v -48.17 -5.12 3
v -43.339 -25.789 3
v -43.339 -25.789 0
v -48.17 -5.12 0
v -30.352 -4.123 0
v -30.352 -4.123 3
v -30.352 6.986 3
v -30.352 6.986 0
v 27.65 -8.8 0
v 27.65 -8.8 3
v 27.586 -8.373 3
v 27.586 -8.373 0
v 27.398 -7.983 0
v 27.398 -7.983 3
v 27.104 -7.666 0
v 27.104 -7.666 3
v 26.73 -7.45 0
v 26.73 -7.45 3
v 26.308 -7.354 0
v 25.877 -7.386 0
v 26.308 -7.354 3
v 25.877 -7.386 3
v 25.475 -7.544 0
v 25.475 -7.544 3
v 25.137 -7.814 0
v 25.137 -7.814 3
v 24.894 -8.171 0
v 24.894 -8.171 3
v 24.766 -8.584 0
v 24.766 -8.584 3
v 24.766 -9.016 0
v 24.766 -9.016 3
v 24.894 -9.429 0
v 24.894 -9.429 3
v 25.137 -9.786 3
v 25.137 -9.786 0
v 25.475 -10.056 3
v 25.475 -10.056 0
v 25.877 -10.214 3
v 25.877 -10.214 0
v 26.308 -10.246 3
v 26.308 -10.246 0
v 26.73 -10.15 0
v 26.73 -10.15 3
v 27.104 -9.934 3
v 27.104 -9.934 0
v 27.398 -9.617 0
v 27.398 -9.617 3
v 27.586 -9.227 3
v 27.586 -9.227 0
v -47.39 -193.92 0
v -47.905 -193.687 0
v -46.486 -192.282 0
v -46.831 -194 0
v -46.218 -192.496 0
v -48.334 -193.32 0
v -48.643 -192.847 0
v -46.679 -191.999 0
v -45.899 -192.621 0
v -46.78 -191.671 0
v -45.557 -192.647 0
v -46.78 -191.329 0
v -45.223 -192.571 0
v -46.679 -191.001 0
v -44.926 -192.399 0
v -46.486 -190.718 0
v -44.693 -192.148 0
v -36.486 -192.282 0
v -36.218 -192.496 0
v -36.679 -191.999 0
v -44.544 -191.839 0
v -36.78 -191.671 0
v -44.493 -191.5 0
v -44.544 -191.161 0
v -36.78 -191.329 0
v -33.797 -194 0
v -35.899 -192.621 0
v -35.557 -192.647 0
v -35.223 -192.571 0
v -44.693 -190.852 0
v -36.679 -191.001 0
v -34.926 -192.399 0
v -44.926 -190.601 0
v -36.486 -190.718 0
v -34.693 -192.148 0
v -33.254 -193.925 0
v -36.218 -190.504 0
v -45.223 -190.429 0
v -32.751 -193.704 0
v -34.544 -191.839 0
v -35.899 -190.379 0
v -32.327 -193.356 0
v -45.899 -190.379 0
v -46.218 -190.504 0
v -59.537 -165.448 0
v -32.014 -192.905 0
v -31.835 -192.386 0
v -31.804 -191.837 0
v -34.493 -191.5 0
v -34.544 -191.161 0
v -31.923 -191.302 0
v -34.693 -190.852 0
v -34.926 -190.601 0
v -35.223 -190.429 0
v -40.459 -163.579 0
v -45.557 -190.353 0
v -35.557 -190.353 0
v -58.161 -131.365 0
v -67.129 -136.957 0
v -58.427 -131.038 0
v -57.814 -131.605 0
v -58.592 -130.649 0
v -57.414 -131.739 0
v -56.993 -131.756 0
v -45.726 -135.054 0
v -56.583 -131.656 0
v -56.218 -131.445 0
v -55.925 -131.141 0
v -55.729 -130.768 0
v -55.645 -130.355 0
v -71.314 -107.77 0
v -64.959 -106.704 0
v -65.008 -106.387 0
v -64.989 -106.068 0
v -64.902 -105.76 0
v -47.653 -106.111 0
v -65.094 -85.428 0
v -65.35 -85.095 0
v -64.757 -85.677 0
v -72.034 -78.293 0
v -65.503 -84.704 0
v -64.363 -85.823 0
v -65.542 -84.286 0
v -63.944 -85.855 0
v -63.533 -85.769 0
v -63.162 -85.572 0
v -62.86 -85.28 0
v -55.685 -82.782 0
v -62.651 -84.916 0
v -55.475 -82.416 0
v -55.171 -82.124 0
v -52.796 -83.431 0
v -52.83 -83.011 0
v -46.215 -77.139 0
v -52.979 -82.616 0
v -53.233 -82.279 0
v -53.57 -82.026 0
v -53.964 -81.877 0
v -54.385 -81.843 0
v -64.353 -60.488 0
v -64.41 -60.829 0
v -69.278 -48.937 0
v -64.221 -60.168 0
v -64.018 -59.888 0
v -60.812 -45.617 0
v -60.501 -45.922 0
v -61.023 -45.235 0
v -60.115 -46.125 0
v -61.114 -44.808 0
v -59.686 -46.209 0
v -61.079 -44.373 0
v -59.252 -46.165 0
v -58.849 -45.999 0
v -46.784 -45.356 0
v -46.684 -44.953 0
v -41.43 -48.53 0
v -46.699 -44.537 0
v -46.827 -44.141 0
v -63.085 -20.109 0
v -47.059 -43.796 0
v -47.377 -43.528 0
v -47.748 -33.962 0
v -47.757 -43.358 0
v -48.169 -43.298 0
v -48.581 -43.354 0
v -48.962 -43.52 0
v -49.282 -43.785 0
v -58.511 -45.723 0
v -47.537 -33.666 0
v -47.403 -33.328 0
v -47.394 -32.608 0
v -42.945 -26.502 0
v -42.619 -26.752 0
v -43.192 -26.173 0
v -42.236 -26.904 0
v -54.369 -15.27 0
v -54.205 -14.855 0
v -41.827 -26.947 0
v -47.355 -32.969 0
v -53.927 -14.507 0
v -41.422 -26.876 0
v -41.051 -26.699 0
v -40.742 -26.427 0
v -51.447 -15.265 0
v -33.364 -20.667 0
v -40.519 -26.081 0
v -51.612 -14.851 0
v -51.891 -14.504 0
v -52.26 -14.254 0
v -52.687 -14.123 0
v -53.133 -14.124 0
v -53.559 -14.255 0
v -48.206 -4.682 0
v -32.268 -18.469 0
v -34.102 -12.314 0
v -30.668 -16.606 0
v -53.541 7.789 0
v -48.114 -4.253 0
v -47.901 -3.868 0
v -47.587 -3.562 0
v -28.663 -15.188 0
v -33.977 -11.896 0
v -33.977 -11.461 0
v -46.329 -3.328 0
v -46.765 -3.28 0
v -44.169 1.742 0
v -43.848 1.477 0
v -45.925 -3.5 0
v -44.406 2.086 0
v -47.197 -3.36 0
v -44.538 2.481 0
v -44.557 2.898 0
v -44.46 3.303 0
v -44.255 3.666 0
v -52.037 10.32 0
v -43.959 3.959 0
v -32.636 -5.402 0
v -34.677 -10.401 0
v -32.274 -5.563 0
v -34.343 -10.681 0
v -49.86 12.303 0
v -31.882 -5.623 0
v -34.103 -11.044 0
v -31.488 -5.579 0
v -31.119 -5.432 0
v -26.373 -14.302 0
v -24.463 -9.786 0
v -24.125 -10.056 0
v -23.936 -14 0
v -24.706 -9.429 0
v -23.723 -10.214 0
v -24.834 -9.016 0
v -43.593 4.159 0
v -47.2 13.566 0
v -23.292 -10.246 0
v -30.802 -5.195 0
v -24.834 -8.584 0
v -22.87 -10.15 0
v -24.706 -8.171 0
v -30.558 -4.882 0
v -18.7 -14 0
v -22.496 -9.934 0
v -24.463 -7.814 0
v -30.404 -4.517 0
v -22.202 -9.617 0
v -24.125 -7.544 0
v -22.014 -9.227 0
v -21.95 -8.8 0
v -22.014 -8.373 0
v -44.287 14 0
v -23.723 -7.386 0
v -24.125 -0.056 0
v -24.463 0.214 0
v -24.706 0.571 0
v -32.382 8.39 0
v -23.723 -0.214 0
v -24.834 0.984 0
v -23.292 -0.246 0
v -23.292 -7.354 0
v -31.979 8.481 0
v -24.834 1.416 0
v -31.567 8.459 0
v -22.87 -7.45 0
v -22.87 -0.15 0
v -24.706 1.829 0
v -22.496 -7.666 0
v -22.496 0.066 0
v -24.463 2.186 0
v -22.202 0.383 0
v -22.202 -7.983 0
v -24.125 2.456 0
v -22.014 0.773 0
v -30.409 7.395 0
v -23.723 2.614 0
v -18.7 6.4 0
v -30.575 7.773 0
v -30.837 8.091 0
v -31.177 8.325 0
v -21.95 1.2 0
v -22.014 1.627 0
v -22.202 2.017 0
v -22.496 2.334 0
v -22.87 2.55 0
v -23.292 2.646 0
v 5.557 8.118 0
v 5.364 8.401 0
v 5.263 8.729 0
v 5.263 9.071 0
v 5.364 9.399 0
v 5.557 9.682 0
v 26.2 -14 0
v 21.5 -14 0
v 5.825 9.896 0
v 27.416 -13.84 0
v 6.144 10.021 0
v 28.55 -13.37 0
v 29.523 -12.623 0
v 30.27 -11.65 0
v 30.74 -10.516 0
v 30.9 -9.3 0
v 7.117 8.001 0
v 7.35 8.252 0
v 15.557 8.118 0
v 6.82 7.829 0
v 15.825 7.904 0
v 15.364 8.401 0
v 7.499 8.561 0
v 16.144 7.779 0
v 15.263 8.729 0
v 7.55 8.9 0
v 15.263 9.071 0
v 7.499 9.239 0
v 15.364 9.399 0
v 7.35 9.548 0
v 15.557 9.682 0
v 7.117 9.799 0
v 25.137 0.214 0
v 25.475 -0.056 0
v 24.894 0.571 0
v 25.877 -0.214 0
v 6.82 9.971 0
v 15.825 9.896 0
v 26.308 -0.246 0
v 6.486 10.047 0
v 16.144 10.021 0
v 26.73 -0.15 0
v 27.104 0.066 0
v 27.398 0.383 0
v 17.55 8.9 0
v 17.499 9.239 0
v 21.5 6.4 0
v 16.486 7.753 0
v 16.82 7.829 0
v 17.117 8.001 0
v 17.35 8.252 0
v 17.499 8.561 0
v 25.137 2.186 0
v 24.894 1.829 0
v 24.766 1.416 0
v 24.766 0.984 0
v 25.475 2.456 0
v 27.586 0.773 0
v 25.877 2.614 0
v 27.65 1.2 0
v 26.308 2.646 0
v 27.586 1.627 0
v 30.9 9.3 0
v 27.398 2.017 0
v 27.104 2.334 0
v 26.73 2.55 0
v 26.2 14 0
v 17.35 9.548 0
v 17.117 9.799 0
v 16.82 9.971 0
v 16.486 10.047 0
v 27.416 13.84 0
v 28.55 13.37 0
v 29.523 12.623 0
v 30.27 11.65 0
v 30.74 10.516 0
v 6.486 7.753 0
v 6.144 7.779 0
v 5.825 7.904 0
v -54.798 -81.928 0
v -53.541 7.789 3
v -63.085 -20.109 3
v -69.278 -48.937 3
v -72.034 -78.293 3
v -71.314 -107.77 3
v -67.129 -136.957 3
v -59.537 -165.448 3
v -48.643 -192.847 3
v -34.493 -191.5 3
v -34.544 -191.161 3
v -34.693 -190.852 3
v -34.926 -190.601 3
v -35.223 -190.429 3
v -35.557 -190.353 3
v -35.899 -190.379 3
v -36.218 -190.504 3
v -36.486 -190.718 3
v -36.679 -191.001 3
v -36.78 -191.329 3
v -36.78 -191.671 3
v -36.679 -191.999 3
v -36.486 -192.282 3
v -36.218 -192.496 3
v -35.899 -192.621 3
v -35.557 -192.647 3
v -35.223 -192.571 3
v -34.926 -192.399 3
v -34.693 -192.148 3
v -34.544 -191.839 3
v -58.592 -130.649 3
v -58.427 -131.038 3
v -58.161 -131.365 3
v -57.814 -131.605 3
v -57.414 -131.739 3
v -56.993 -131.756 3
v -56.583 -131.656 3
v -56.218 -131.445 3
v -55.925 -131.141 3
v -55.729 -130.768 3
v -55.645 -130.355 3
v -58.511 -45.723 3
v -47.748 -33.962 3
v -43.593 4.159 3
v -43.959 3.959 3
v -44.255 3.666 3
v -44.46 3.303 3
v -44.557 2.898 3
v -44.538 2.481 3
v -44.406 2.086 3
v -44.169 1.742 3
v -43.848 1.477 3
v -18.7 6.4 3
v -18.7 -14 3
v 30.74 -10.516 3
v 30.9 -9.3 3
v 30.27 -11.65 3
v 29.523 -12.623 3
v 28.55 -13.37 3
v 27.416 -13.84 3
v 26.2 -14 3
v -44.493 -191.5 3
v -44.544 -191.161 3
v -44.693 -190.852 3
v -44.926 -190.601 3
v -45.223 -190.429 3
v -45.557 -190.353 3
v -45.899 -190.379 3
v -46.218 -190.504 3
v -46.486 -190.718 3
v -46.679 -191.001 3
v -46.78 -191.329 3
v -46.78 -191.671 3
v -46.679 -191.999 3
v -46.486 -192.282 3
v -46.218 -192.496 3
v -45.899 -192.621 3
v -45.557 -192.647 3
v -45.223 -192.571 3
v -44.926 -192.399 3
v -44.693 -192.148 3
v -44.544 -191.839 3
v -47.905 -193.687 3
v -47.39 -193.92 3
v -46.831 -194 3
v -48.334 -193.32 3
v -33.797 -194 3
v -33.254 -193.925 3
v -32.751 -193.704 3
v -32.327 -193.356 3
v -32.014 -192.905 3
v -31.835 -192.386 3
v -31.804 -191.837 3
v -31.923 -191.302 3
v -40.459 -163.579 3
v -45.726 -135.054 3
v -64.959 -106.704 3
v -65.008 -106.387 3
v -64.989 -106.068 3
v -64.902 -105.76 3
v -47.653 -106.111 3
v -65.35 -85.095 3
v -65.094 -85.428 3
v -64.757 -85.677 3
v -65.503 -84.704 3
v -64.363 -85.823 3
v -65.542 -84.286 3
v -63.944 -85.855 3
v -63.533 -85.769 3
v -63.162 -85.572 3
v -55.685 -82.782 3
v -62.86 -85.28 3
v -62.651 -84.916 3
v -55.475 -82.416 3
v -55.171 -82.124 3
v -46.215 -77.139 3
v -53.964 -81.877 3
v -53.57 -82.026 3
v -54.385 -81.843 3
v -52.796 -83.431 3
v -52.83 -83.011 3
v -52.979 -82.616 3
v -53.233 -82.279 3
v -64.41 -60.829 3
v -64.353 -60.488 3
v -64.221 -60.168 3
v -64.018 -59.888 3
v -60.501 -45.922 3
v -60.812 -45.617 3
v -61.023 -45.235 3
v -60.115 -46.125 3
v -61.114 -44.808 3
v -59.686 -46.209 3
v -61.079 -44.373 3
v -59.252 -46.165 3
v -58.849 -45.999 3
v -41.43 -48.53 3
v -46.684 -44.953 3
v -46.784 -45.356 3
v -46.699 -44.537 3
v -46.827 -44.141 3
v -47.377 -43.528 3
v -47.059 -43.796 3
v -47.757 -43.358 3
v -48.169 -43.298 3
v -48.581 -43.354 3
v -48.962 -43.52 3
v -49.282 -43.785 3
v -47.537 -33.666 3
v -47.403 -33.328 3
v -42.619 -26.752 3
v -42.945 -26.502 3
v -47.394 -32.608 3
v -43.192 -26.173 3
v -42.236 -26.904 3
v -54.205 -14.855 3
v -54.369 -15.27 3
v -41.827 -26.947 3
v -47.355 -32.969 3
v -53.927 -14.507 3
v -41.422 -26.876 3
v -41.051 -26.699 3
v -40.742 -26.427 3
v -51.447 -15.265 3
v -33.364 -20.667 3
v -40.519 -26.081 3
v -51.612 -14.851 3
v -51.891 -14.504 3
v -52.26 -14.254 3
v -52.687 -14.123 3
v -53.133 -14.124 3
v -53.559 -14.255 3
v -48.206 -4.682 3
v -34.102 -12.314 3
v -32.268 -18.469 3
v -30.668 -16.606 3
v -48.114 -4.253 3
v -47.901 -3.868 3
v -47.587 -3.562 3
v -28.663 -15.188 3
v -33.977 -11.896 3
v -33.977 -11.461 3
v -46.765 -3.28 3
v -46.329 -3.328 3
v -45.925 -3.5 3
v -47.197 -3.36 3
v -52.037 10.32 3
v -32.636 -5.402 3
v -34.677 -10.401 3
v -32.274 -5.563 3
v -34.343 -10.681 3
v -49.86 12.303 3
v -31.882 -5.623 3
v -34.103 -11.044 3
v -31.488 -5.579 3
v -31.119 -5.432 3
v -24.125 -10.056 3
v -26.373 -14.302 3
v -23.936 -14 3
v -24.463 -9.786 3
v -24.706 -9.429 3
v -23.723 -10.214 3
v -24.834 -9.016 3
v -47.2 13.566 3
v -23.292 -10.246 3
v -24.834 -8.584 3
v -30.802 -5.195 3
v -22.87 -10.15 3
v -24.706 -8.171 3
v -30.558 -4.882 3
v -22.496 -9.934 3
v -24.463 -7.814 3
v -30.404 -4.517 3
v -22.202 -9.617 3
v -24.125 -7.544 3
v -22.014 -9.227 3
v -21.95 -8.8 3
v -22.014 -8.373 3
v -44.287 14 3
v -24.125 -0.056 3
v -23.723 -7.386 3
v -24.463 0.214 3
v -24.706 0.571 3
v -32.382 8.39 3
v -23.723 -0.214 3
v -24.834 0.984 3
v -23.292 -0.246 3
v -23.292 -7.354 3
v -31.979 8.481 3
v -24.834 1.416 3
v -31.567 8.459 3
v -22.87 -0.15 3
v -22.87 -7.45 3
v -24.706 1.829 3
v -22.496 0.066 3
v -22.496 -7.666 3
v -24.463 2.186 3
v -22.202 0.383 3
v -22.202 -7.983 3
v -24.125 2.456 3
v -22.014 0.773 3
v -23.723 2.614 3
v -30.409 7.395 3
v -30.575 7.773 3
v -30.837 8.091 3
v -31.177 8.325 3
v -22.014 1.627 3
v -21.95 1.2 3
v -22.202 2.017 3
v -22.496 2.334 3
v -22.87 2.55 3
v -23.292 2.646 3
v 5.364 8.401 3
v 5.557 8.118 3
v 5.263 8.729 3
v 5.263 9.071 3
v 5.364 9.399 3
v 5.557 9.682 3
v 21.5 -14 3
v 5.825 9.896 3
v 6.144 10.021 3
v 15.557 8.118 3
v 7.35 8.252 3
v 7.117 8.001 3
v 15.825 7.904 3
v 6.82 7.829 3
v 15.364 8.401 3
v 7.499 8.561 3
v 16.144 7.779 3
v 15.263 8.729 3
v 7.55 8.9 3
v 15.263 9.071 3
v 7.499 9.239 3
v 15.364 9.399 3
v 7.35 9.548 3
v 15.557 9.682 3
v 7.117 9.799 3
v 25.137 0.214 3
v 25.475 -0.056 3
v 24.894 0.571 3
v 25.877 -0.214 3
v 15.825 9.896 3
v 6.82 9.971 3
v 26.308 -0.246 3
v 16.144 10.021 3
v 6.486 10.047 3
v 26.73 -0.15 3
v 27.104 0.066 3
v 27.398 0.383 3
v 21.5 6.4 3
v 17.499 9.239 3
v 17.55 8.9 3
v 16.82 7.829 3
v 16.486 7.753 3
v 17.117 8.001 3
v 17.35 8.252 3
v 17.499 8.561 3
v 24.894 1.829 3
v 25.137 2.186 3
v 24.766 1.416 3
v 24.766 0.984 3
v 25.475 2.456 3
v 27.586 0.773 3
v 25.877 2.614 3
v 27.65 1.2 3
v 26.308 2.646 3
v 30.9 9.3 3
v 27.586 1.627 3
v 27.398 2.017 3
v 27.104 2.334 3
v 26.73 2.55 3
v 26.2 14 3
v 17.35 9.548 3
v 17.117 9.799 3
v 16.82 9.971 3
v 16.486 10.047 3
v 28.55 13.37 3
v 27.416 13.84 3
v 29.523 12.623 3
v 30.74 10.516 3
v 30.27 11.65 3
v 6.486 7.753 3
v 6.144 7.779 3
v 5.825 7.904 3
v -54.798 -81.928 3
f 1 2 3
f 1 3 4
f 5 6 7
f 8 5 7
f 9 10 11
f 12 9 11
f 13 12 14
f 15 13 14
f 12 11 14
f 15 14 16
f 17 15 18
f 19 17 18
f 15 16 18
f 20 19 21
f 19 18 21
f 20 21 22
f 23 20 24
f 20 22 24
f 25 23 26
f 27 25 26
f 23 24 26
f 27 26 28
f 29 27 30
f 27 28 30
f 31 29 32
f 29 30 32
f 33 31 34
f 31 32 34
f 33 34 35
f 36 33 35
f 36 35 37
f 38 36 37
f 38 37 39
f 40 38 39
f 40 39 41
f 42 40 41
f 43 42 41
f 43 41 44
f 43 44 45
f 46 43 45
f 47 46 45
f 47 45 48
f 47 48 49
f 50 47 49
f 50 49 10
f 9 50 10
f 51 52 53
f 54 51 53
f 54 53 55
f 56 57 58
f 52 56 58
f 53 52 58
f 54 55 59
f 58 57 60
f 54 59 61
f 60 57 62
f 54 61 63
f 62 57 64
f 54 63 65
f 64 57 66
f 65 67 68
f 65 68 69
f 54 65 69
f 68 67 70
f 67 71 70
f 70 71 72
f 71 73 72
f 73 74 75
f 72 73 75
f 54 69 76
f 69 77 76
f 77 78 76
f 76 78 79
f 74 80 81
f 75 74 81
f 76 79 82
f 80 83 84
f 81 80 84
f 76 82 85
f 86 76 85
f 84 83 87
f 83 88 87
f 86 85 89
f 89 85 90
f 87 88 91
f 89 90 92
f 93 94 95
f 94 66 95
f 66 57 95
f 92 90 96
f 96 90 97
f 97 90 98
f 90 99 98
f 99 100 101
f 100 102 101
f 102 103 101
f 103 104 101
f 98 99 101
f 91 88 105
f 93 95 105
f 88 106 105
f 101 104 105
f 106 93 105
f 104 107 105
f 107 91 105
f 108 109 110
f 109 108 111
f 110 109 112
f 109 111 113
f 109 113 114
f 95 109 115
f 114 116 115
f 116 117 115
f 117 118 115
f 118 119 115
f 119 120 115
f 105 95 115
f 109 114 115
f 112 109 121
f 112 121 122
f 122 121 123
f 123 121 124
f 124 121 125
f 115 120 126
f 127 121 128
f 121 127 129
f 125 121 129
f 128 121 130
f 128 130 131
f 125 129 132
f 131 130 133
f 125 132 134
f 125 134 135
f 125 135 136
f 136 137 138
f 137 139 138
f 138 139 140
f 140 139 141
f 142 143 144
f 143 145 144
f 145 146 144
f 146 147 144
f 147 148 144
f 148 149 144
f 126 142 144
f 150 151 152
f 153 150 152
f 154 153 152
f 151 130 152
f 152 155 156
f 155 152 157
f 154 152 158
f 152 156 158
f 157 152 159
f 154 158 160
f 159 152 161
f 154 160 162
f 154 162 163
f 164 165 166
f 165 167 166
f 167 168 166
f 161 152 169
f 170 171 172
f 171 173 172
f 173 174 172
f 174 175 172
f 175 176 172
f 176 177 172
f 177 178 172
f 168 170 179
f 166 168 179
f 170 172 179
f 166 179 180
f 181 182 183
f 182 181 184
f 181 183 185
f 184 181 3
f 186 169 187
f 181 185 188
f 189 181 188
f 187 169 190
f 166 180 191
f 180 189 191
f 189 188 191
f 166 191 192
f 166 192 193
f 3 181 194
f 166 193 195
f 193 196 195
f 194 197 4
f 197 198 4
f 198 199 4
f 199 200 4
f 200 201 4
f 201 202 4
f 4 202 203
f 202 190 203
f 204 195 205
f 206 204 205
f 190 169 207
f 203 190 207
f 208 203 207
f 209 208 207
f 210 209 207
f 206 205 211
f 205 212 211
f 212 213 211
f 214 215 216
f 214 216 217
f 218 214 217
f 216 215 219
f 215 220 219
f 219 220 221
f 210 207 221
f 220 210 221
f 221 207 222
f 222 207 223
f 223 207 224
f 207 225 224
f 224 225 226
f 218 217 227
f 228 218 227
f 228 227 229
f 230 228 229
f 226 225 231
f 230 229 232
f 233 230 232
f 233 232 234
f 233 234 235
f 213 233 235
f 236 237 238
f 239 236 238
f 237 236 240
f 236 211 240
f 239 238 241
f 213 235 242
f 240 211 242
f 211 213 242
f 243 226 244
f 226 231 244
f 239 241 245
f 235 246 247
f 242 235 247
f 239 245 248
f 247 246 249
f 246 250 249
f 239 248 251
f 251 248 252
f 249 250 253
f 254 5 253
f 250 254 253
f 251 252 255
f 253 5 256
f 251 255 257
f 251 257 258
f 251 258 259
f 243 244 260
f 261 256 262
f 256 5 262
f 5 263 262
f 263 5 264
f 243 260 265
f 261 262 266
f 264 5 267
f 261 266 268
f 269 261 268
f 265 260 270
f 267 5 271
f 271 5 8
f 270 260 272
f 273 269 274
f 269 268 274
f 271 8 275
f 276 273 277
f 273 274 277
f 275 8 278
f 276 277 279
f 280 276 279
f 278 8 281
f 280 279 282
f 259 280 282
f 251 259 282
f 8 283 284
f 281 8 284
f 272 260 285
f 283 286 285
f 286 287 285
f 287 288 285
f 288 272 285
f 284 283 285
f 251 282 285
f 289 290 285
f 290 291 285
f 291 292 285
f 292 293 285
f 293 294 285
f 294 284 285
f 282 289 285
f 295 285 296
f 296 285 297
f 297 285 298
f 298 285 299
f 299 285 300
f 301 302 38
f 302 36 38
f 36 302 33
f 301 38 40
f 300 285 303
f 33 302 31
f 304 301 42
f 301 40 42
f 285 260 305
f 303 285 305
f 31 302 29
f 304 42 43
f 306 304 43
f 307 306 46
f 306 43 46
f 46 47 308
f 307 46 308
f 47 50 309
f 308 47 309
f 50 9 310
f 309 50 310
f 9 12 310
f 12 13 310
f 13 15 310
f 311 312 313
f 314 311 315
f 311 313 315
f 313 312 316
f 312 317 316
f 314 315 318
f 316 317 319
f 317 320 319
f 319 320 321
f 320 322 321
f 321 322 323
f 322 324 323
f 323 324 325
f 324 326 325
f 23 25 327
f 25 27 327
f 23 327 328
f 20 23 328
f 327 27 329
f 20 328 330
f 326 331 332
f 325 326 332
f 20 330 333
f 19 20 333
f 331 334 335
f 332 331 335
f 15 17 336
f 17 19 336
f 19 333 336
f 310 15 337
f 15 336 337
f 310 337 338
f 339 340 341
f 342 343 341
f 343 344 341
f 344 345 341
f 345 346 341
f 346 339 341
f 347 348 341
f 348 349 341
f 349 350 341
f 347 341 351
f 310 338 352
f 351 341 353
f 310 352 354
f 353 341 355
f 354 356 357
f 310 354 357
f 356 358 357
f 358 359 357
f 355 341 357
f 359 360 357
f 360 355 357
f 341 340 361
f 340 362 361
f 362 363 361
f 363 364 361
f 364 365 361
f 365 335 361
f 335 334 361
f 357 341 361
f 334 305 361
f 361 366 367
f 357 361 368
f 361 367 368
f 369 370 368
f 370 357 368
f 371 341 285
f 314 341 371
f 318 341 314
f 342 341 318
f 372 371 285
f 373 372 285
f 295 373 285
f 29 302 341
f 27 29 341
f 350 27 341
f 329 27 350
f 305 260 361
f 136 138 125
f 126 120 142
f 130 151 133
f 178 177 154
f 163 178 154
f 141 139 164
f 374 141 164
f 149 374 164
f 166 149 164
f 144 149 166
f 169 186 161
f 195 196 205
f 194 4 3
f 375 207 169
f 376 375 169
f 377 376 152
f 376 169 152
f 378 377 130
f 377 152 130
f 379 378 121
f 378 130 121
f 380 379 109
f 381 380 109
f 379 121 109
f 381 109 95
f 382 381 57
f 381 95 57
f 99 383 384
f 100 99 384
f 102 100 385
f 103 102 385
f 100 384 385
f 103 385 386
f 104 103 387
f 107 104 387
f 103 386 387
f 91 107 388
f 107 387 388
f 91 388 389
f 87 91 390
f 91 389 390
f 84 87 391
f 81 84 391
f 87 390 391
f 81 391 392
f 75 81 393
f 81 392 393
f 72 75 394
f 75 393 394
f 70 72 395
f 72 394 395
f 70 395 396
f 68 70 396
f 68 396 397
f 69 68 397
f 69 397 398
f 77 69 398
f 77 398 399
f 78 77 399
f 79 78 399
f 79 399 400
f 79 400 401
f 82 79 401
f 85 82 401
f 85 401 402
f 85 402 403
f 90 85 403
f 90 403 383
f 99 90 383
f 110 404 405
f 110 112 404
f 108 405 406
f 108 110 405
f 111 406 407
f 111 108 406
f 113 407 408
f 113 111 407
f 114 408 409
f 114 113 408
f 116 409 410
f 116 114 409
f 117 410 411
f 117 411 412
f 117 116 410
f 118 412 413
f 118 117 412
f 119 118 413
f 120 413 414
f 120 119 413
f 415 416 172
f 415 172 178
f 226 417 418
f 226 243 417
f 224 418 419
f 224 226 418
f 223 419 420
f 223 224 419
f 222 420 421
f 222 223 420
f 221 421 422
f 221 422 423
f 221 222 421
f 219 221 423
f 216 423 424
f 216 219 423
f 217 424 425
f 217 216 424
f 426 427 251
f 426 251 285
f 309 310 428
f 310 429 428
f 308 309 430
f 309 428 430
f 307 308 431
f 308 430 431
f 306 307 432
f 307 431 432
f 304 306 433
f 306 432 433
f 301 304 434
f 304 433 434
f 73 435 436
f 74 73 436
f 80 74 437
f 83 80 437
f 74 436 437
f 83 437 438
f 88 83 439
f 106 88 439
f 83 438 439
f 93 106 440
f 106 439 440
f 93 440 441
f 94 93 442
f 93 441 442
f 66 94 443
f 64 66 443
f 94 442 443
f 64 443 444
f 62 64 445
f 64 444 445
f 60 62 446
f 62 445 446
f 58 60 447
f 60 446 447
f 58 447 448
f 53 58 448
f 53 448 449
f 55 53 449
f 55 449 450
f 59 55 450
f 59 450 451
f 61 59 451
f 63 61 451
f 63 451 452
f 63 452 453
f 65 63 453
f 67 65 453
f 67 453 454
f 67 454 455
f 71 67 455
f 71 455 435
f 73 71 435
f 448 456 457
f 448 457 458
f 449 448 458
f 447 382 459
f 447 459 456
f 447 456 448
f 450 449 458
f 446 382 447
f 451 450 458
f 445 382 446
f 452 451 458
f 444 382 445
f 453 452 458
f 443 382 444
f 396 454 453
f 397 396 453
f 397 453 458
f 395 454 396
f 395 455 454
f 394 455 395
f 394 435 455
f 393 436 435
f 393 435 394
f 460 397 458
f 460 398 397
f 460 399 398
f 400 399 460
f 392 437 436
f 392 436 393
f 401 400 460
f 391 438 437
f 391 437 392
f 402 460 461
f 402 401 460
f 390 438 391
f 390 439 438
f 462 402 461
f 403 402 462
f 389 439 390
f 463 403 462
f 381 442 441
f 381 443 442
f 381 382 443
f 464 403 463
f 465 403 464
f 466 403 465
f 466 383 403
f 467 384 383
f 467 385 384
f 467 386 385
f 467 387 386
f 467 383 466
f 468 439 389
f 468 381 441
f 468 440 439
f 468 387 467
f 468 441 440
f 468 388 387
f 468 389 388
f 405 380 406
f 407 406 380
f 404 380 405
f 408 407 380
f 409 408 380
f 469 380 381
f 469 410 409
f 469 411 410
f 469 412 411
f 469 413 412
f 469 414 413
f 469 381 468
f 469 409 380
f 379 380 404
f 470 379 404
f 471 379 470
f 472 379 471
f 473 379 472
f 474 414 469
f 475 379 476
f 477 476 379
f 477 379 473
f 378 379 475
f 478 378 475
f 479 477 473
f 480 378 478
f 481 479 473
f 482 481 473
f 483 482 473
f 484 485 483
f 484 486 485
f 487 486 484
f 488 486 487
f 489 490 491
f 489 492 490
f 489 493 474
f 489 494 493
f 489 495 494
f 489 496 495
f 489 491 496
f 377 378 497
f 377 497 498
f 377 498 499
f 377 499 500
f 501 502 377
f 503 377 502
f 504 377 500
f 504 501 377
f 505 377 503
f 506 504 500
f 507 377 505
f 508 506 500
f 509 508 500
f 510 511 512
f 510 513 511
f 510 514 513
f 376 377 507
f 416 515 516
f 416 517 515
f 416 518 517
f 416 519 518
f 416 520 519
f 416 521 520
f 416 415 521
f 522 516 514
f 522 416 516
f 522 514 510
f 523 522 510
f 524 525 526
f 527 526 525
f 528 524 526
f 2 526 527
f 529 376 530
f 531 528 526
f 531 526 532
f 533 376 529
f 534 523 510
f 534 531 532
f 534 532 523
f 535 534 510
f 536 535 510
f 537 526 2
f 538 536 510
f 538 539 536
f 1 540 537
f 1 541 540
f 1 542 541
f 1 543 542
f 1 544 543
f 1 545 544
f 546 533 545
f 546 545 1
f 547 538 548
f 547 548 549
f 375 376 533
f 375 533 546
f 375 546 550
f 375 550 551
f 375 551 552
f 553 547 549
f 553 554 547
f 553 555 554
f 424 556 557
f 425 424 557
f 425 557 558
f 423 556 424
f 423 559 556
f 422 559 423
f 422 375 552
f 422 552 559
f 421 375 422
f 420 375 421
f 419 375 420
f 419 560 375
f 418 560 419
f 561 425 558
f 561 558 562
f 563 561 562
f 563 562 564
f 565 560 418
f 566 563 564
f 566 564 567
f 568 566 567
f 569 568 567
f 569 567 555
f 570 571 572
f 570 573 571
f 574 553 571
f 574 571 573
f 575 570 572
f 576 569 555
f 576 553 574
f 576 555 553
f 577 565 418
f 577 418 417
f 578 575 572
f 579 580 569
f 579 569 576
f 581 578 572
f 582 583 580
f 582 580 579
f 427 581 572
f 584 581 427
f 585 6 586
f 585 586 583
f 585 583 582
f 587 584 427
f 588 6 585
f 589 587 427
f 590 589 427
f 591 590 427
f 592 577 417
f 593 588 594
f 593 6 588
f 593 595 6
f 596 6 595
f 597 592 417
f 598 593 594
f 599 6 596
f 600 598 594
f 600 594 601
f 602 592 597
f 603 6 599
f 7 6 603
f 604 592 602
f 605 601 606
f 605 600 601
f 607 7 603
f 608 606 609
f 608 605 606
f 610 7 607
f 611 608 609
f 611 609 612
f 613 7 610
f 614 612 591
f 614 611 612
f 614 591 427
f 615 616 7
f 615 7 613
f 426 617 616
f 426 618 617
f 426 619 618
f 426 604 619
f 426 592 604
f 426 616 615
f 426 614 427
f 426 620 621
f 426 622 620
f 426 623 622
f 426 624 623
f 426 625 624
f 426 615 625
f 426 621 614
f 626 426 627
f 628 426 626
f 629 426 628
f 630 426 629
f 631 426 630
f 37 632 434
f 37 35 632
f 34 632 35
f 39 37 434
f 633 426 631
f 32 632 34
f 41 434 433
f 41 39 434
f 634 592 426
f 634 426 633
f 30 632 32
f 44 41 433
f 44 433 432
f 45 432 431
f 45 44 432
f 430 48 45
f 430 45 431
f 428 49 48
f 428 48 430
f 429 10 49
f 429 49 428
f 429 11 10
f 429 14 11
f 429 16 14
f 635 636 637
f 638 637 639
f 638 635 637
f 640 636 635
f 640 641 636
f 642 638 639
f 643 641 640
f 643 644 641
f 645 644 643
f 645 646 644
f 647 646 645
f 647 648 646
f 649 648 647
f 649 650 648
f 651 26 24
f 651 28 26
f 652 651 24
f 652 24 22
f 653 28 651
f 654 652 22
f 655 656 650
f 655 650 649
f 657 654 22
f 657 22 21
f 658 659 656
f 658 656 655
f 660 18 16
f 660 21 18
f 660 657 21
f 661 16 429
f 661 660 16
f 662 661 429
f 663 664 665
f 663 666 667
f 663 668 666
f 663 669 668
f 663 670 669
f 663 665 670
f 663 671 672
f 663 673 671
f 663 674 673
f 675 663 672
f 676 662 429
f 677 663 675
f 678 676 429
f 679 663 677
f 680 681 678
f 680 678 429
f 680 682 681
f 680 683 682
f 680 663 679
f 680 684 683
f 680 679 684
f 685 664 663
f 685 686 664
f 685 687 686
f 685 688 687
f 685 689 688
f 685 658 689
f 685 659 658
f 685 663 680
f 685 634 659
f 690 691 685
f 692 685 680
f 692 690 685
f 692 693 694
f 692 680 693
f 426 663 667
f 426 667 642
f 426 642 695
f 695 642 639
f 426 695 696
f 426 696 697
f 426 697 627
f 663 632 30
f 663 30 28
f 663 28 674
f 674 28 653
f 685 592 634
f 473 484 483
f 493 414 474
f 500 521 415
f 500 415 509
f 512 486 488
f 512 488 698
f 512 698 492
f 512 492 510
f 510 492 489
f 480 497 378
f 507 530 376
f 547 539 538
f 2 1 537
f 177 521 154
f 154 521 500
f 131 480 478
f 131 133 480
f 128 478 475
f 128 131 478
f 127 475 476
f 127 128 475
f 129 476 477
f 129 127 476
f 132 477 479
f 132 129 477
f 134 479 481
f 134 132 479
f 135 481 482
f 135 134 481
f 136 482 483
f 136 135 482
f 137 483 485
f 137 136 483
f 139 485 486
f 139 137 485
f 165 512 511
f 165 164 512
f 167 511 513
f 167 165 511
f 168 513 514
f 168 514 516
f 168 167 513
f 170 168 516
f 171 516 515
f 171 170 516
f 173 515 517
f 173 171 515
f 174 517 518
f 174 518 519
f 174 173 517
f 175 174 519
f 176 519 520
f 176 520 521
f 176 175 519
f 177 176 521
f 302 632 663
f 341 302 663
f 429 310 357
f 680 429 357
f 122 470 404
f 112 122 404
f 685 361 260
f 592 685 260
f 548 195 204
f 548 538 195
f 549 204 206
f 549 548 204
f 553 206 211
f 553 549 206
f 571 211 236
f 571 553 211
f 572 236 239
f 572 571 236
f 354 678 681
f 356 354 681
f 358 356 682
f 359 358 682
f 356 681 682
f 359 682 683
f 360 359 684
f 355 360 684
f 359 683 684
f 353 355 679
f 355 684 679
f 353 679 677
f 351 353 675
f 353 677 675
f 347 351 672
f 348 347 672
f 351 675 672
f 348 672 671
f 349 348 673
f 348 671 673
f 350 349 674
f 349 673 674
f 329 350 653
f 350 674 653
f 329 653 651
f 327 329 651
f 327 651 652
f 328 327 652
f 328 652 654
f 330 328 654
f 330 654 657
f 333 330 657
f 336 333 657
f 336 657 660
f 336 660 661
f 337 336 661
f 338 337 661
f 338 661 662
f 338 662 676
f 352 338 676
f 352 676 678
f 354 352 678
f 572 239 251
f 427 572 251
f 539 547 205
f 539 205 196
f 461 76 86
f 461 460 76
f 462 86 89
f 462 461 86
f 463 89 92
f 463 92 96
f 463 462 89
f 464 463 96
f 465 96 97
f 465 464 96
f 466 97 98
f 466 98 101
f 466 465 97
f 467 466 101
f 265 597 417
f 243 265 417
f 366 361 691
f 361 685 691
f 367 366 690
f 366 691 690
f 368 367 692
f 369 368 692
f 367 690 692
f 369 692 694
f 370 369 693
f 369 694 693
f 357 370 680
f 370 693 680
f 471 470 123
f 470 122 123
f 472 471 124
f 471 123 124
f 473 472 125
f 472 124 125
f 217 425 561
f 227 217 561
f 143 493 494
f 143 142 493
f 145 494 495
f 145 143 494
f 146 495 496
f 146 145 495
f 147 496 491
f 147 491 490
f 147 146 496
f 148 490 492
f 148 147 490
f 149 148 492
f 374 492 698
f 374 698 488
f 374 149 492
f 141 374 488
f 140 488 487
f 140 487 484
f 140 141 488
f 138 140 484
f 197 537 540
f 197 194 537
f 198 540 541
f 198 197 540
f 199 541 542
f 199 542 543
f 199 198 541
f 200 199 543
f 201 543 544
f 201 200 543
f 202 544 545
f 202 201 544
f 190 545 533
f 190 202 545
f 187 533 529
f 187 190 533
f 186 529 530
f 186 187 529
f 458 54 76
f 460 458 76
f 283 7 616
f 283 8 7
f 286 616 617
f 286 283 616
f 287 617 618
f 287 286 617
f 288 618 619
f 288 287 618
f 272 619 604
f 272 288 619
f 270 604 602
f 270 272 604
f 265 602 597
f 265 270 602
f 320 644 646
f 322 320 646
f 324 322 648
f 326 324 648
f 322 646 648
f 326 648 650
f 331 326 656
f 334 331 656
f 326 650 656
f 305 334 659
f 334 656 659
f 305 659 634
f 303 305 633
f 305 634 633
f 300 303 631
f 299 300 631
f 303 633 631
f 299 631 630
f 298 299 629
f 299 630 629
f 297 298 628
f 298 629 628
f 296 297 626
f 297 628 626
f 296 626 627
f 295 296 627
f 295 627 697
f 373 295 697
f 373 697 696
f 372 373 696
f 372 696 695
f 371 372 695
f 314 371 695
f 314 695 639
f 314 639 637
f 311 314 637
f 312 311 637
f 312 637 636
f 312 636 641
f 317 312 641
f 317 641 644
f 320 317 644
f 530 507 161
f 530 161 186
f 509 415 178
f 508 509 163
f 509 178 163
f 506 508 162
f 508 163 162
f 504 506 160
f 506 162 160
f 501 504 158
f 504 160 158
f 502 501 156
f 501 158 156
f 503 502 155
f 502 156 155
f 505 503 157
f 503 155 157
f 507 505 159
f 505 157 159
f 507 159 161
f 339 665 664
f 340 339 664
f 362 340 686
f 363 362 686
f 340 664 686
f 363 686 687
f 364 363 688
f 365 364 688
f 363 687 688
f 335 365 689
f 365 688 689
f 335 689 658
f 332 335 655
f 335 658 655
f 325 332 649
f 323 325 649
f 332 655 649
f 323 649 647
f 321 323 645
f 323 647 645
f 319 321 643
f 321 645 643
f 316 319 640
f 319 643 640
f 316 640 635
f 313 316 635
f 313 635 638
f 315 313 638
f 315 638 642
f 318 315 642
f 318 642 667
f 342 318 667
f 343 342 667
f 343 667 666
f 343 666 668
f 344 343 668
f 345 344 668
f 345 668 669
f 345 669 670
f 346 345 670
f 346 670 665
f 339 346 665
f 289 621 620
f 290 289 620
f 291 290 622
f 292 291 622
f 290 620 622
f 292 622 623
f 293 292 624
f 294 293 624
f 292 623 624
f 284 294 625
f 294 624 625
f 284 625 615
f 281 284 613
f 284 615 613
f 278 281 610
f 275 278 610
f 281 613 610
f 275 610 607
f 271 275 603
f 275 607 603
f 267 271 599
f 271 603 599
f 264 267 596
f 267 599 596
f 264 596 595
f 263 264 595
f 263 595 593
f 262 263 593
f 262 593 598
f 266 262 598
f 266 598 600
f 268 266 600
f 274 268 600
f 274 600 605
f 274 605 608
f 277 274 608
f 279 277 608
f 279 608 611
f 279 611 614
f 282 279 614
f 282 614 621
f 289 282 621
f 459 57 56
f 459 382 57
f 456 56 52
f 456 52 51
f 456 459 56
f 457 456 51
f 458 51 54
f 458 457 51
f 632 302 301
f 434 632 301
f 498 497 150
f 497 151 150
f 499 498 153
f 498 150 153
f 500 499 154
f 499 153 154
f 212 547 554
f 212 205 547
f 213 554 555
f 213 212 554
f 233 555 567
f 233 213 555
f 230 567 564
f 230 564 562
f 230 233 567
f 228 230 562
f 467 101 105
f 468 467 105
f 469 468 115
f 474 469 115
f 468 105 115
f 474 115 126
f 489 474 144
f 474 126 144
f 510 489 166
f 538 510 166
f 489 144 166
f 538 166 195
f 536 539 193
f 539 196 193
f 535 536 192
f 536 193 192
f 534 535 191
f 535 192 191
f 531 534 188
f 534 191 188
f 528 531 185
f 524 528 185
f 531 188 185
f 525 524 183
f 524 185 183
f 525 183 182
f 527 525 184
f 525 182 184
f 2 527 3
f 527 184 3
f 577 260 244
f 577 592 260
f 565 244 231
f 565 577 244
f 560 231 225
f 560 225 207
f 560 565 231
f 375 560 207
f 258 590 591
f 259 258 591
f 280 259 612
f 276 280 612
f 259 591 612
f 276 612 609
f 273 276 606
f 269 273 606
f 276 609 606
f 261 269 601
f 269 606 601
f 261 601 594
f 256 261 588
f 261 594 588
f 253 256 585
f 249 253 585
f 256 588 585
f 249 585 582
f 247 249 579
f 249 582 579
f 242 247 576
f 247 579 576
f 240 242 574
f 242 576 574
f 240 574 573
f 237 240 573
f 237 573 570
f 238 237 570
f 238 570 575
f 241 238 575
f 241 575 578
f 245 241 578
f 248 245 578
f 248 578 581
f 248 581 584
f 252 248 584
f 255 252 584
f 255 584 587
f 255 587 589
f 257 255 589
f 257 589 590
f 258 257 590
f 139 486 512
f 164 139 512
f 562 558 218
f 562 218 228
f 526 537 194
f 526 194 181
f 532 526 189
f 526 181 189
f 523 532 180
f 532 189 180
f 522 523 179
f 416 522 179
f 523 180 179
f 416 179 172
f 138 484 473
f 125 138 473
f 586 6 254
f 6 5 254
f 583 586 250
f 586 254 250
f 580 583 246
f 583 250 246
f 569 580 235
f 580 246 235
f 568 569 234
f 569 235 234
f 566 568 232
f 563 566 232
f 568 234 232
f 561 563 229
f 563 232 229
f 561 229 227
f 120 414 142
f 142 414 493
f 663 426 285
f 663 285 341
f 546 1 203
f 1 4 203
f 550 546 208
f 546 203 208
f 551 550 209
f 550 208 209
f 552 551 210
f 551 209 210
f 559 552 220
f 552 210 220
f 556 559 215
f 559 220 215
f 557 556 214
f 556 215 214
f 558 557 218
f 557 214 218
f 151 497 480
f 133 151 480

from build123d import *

# Parameters (mm, degrees)
BOSS_EXTRU_1_DEPTH      = 3
ENL_V_MAT_EXTRU_1_REACH = 209.016
ESQUISSE2_W             = 40.2
ESQUISSE2_H             = 20.4
ENL_V_MAT_EXTRU_2_REACH = 209.016
ESQUISSE3_R             = 1.45
CONG_2_R                = 4.7
CONG_3_R                = 10
CONG_5_R                = 2
ENL_V_MAT_EXTRU_3_REACH = 209.016
CONG_6_R                = 1.5
ENL_V_MAT_EXTRU_4_REACH = 209.016
ESQUISSE5_R             = 1.15
ESQUISSE6_R             = 1.15
ENL_V_MAT_EXTRU_5_DEPTH = 10


with BuildPart() as part:
    # Esquisse1 → Boss.-Extru.1 (new body)
    with BuildSketch(Plane.XY):
        with BuildLine():
            Line((-30.9, -14), (30.9, -14))
            Line((30.9, -14), (30.9, 14))
            Line((30.9, 14), (-50.9, 14))
            ThreePointArc((-50.9, 14), (-72.161104257, -90.305053327), (-48.1, -194))
            Line((-48.1, -194), (-30.9, -194))
            ThreePointArc((-30.9, -194), (-47.661924206, -104), (-30.9, -14))
        make_face()
    extrude(amount=BOSS_EXTRU_1_DEPTH)

    # Esquisse2 → Enlèv. mat.-Extru.1 (cut, up to next)
    with BuildSketch(Plane.XY.offset(3), mode=Mode.PRIVATE) as enl_v_mat_extru_1_sk1:
        with Locations((1.4, -3.8)):
            Rectangle(ESQUISSE2_W, ESQUISSE2_H)
    enl_v_mat_extru_1_tool1 = extrude(enl_v_mat_extru_1_sk1.sketch, amount=-ENL_V_MAT_EXTRU_1_REACH, mode=Mode.PRIVATE) & part.part
    add(enl_v_mat_extru_1_tool1.solids().sort_by_distance((1.4, -3.8, 3))[0], mode=Mode.SUBTRACT)

    # Esquisse3 → Enlèv. mat.-Extru.2 (cut, up to next)
    with BuildSketch(Plane.XY.offset(3), mode=Mode.PRIVATE) as enl_v_mat_extru_2_sk1:
        with Locations((26.2, -8.8)):
            Circle(ESQUISSE3_R)
    enl_v_mat_extru_2_tool1 = extrude(enl_v_mat_extru_2_sk1.sketch, amount=-ENL_V_MAT_EXTRU_2_REACH, mode=Mode.PRIVATE) & part.part
    # Esquisse3 → Enlèv. mat.-Extru.2 (cut, up to next)
    with BuildSketch(Plane.XY.offset(3), mode=Mode.PRIVATE) as enl_v_mat_extru_2_sk2:
        with Locations((-23.4, -8.8)):
            Circle(ESQUISSE3_R)
    enl_v_mat_extru_2_tool2 = extrude(enl_v_mat_extru_2_sk2.sketch, amount=-ENL_V_MAT_EXTRU_2_REACH, mode=Mode.PRIVATE) & part.part
    # Esquisse3 → Enlèv. mat.-Extru.2 (cut, up to next)
    with BuildSketch(Plane.XY.offset(3), mode=Mode.PRIVATE) as enl_v_mat_extru_2_sk3:
        with Locations((-23.4, 1.2)):
            Circle(ESQUISSE3_R)
    enl_v_mat_extru_2_tool3 = extrude(enl_v_mat_extru_2_sk3.sketch, amount=-ENL_V_MAT_EXTRU_2_REACH, mode=Mode.PRIVATE) & part.part
    # Esquisse3 → Enlèv. mat.-Extru.2 (cut, up to next)
    with BuildSketch(Plane.XY.offset(3), mode=Mode.PRIVATE) as enl_v_mat_extru_2_sk4:
        with Locations((26.2, 1.2)):
            Circle(ESQUISSE3_R)
    enl_v_mat_extru_2_tool4 = extrude(enl_v_mat_extru_2_sk4.sketch, amount=-ENL_V_MAT_EXTRU_2_REACH, mode=Mode.PRIVATE) & part.part
    add(enl_v_mat_extru_2_tool1.solids().sort_by_distance((26.2, -8.8, 3))[0], mode=Mode.SUBTRACT)
    add(enl_v_mat_extru_2_tool2.solids().sort_by_distance((-23.4, -8.8, 3))[0], mode=Mode.SUBTRACT)
    add(enl_v_mat_extru_2_tool3.solids().sort_by_distance((-23.4, 1.2, 3))[0], mode=Mode.SUBTRACT)
    add(enl_v_mat_extru_2_tool4.solids().sort_by_distance((26.2, 1.2, 3))[0], mode=Mode.SUBTRACT)

    # Congé2
    cong_2_edges = [part.edges().sort_by_distance(p)[0] for p in [
        (30.9, -14, 1.5),
        (30.9, 14, 1.5),
    ]]
    fillet(cong_2_edges, radius=CONG_2_R)

    # Congé3
    cong_3_edges = [part.edges().sort_by_distance(p)[0] for p in [
        (-30.9, -14, 1.5),
        (-50.9, 14, 1.5),
    ]]
    fillet(cong_3_edges, radius=CONG_3_R)

    # Congé5
    cong_5_edges = [part.edges().sort_by_distance(p)[0] for p in [
        (-30.9, -194, 1.5),
        (-48.1, -194, 1.5),
    ]]
    fillet(cong_5_edges, radius=CONG_5_R)

    # Esquisse4 → Enlèv. mat.-Extru.3 (cut, up to next)
    with BuildSketch(Plane.XY.offset(3), mode=Mode.PRIVATE) as enl_v_mat_extru_3_sk1:
        Polygon((-33.536552076, -11.101012911), (-42.351911307, -30.013593499), (-48.987474587, -1.620621605), align=None)
    enl_v_mat_extru_3_tool1 = extrude(enl_v_mat_extru_3_sk1.sketch, amount=-ENL_V_MAT_EXTRU_3_REACH, mode=Mode.PRIVATE) & part.part
    # Esquisse4 → Enlèv. mat.-Extru.3 (cut, up to next)
    with BuildSketch(Plane.XY.offset(3), mode=Mode.PRIVATE) as enl_v_mat_extru_3_sk2:
        Polygon((-52.917399073, -8.972975376), (-47.213856869, -33.377913835), (-62.359919338, -49.92921121), align=None)
    enl_v_mat_extru_3_tool2 = extrude(enl_v_mat_extru_3_sk2.sketch, amount=-ENL_V_MAT_EXTRU_3_REACH, mode=Mode.PRIVATE) & part.part
    # Esquisse4 → Enlèv. mat.-Extru.3 (cut, up to next)
    with BuildSketch(Plane.XY.offset(3), mode=Mode.PRIVATE) as enl_v_mat_extru_3_sk3:
        Polygon((-43.711860923, -37.698000672), (-64.383676275, -60.287724165), (-65.97140029, -93.194177891), align=None)
    enl_v_mat_extru_3_tool3 = extrude(enl_v_mat_extru_3_sk3.sketch, amount=-ENL_V_MAT_EXTRU_3_REACH, mode=Mode.PRIVATE) & part.part
    # Esquisse4 → Enlèv. mat.-Extru.3 (cut, up to next)
    with BuildSketch(Plane.XY.offset(3), mode=Mode.PRIVATE) as enl_v_mat_extru_3_sk4:
        Polygon((-46.457316631, 3.078230456), (-30.351945171, -6.80371824), (-30.351945171, 9.155359803), align=None)
    enl_v_mat_extru_3_tool4 = extrude(enl_v_mat_extru_3_sk4.sketch, amount=-ENL_V_MAT_EXTRU_3_REACH, mode=Mode.PRIVATE) & part.part
    # Esquisse4 → Enlèv. mat.-Extru.3 (cut, up to next)
    with BuildSketch(Plane.XY.offset(3), mode=Mode.PRIVATE) as enl_v_mat_extru_3_sk5:
        Polygon((-52.234282619, -74.177445722), (-65.087399313, -106.222081959), (-56.206990273, -139.61663464), align=None)
    enl_v_mat_extru_3_tool5 = extrude(enl_v_mat_extru_3_sk5.sketch, amount=-ENL_V_MAT_EXTRU_3_REACH, mode=Mode.PRIVATE) & part.part
    add(enl_v_mat_extru_3_tool1.solids().sort_by_distance((-41.625313, -14.245076, 3))[0], mode=Mode.SUBTRACT)
    add(enl_v_mat_extru_3_tool2.solids().sort_by_distance((-54.163725, -30.760033, 3))[0], mode=Mode.SUBTRACT)
    add(enl_v_mat_extru_3_tool3.solids().sort_by_distance((-58.022312, -63.726634, 3))[0], mode=Mode.SUBTRACT)
    add(enl_v_mat_extru_3_tool4.solids().sort_by_distance((-35.720402, 1.809957, 3))[0], mode=Mode.SUBTRACT)
    add(enl_v_mat_extru_3_tool5.solids().sort_by_distance((-57.842891, -106.672054, 3))[0], mode=Mode.SUBTRACT)

    # Congé6
    cong_6_edges = [part.edges().sort_by_distance(p)[0] for p in [
        (-62.359919338, -49.92921121, 1.5),
        (-52.917399073, -8.972975376, 1.5),
        (-47.213856869, -33.377913835, 1.5),
        (-46.457316631, 3.078230456, 1.5),
        (-30.351945171, 9.155359803, 1.5),
        (-30.351945171, -6.80371824, 1.5),
        (-52.234282619, -74.177445722, 1.5),
        (-56.206990273, -139.61663464, 1.5),
        (-65.087399313, -106.222081959, 1.5),
        (-43.711860923, -37.698000672, 1.5),
        (-65.97140029, -93.194177891, 1.5),
        (-64.383676275, -60.287724165, 1.5),
        (-48.987474587, -1.620621605, 1.5),
        (-33.536552076, -11.101012911, 1.5),
        (-42.351911307, -30.013593499, 1.5),
    ]]
    fillet(cong_6_edges, radius=CONG_6_R)

    # Esquisse5 → Enlèv. mat.-Extru.4 (cut, up to next)
    with BuildSketch(Plane.XY.offset(3), mode=Mode.PRIVATE) as enl_v_mat_extru_4_sk1:
        with Locations((16.4, 8.9)):
            Circle(ESQUISSE5_R)
    enl_v_mat_extru_4_tool1 = extrude(enl_v_mat_extru_4_sk1.sketch, amount=-ENL_V_MAT_EXTRU_4_REACH, mode=Mode.PRIVATE) & part.part
    # Esquisse5 → Enlèv. mat.-Extru.4 (cut, up to next)
    with BuildSketch(Plane.XY.offset(3), mode=Mode.PRIVATE) as enl_v_mat_extru_4_sk2:
        with Locations((6.4, 8.9)):
            Circle(ESQUISSE5_R)
    enl_v_mat_extru_4_tool2 = extrude(enl_v_mat_extru_4_sk2.sketch, amount=-ENL_V_MAT_EXTRU_4_REACH, mode=Mode.PRIVATE) & part.part
    add(enl_v_mat_extru_4_tool1.solids().sort_by_distance((16.4, 8.9, 3))[0], mode=Mode.SUBTRACT)
    add(enl_v_mat_extru_4_tool2.solids().sort_by_distance((6.4, 8.9, 3))[0], mode=Mode.SUBTRACT)

    # Esquisse6 → Enlèv. mat.-Extru.5 (cut)
    with BuildSketch(Plane.XY.offset(3)):
        with Locations((-45.64268297, -191.5)):
            Circle(ESQUISSE6_R)
        with Locations((-35.64268297, -191.5)):
            Circle(ESQUISSE6_R)
    extrude(amount=-ENL_V_MAT_EXTRU_5_DEPTH, mode=Mode.SUBTRACT)


solid = part.part
